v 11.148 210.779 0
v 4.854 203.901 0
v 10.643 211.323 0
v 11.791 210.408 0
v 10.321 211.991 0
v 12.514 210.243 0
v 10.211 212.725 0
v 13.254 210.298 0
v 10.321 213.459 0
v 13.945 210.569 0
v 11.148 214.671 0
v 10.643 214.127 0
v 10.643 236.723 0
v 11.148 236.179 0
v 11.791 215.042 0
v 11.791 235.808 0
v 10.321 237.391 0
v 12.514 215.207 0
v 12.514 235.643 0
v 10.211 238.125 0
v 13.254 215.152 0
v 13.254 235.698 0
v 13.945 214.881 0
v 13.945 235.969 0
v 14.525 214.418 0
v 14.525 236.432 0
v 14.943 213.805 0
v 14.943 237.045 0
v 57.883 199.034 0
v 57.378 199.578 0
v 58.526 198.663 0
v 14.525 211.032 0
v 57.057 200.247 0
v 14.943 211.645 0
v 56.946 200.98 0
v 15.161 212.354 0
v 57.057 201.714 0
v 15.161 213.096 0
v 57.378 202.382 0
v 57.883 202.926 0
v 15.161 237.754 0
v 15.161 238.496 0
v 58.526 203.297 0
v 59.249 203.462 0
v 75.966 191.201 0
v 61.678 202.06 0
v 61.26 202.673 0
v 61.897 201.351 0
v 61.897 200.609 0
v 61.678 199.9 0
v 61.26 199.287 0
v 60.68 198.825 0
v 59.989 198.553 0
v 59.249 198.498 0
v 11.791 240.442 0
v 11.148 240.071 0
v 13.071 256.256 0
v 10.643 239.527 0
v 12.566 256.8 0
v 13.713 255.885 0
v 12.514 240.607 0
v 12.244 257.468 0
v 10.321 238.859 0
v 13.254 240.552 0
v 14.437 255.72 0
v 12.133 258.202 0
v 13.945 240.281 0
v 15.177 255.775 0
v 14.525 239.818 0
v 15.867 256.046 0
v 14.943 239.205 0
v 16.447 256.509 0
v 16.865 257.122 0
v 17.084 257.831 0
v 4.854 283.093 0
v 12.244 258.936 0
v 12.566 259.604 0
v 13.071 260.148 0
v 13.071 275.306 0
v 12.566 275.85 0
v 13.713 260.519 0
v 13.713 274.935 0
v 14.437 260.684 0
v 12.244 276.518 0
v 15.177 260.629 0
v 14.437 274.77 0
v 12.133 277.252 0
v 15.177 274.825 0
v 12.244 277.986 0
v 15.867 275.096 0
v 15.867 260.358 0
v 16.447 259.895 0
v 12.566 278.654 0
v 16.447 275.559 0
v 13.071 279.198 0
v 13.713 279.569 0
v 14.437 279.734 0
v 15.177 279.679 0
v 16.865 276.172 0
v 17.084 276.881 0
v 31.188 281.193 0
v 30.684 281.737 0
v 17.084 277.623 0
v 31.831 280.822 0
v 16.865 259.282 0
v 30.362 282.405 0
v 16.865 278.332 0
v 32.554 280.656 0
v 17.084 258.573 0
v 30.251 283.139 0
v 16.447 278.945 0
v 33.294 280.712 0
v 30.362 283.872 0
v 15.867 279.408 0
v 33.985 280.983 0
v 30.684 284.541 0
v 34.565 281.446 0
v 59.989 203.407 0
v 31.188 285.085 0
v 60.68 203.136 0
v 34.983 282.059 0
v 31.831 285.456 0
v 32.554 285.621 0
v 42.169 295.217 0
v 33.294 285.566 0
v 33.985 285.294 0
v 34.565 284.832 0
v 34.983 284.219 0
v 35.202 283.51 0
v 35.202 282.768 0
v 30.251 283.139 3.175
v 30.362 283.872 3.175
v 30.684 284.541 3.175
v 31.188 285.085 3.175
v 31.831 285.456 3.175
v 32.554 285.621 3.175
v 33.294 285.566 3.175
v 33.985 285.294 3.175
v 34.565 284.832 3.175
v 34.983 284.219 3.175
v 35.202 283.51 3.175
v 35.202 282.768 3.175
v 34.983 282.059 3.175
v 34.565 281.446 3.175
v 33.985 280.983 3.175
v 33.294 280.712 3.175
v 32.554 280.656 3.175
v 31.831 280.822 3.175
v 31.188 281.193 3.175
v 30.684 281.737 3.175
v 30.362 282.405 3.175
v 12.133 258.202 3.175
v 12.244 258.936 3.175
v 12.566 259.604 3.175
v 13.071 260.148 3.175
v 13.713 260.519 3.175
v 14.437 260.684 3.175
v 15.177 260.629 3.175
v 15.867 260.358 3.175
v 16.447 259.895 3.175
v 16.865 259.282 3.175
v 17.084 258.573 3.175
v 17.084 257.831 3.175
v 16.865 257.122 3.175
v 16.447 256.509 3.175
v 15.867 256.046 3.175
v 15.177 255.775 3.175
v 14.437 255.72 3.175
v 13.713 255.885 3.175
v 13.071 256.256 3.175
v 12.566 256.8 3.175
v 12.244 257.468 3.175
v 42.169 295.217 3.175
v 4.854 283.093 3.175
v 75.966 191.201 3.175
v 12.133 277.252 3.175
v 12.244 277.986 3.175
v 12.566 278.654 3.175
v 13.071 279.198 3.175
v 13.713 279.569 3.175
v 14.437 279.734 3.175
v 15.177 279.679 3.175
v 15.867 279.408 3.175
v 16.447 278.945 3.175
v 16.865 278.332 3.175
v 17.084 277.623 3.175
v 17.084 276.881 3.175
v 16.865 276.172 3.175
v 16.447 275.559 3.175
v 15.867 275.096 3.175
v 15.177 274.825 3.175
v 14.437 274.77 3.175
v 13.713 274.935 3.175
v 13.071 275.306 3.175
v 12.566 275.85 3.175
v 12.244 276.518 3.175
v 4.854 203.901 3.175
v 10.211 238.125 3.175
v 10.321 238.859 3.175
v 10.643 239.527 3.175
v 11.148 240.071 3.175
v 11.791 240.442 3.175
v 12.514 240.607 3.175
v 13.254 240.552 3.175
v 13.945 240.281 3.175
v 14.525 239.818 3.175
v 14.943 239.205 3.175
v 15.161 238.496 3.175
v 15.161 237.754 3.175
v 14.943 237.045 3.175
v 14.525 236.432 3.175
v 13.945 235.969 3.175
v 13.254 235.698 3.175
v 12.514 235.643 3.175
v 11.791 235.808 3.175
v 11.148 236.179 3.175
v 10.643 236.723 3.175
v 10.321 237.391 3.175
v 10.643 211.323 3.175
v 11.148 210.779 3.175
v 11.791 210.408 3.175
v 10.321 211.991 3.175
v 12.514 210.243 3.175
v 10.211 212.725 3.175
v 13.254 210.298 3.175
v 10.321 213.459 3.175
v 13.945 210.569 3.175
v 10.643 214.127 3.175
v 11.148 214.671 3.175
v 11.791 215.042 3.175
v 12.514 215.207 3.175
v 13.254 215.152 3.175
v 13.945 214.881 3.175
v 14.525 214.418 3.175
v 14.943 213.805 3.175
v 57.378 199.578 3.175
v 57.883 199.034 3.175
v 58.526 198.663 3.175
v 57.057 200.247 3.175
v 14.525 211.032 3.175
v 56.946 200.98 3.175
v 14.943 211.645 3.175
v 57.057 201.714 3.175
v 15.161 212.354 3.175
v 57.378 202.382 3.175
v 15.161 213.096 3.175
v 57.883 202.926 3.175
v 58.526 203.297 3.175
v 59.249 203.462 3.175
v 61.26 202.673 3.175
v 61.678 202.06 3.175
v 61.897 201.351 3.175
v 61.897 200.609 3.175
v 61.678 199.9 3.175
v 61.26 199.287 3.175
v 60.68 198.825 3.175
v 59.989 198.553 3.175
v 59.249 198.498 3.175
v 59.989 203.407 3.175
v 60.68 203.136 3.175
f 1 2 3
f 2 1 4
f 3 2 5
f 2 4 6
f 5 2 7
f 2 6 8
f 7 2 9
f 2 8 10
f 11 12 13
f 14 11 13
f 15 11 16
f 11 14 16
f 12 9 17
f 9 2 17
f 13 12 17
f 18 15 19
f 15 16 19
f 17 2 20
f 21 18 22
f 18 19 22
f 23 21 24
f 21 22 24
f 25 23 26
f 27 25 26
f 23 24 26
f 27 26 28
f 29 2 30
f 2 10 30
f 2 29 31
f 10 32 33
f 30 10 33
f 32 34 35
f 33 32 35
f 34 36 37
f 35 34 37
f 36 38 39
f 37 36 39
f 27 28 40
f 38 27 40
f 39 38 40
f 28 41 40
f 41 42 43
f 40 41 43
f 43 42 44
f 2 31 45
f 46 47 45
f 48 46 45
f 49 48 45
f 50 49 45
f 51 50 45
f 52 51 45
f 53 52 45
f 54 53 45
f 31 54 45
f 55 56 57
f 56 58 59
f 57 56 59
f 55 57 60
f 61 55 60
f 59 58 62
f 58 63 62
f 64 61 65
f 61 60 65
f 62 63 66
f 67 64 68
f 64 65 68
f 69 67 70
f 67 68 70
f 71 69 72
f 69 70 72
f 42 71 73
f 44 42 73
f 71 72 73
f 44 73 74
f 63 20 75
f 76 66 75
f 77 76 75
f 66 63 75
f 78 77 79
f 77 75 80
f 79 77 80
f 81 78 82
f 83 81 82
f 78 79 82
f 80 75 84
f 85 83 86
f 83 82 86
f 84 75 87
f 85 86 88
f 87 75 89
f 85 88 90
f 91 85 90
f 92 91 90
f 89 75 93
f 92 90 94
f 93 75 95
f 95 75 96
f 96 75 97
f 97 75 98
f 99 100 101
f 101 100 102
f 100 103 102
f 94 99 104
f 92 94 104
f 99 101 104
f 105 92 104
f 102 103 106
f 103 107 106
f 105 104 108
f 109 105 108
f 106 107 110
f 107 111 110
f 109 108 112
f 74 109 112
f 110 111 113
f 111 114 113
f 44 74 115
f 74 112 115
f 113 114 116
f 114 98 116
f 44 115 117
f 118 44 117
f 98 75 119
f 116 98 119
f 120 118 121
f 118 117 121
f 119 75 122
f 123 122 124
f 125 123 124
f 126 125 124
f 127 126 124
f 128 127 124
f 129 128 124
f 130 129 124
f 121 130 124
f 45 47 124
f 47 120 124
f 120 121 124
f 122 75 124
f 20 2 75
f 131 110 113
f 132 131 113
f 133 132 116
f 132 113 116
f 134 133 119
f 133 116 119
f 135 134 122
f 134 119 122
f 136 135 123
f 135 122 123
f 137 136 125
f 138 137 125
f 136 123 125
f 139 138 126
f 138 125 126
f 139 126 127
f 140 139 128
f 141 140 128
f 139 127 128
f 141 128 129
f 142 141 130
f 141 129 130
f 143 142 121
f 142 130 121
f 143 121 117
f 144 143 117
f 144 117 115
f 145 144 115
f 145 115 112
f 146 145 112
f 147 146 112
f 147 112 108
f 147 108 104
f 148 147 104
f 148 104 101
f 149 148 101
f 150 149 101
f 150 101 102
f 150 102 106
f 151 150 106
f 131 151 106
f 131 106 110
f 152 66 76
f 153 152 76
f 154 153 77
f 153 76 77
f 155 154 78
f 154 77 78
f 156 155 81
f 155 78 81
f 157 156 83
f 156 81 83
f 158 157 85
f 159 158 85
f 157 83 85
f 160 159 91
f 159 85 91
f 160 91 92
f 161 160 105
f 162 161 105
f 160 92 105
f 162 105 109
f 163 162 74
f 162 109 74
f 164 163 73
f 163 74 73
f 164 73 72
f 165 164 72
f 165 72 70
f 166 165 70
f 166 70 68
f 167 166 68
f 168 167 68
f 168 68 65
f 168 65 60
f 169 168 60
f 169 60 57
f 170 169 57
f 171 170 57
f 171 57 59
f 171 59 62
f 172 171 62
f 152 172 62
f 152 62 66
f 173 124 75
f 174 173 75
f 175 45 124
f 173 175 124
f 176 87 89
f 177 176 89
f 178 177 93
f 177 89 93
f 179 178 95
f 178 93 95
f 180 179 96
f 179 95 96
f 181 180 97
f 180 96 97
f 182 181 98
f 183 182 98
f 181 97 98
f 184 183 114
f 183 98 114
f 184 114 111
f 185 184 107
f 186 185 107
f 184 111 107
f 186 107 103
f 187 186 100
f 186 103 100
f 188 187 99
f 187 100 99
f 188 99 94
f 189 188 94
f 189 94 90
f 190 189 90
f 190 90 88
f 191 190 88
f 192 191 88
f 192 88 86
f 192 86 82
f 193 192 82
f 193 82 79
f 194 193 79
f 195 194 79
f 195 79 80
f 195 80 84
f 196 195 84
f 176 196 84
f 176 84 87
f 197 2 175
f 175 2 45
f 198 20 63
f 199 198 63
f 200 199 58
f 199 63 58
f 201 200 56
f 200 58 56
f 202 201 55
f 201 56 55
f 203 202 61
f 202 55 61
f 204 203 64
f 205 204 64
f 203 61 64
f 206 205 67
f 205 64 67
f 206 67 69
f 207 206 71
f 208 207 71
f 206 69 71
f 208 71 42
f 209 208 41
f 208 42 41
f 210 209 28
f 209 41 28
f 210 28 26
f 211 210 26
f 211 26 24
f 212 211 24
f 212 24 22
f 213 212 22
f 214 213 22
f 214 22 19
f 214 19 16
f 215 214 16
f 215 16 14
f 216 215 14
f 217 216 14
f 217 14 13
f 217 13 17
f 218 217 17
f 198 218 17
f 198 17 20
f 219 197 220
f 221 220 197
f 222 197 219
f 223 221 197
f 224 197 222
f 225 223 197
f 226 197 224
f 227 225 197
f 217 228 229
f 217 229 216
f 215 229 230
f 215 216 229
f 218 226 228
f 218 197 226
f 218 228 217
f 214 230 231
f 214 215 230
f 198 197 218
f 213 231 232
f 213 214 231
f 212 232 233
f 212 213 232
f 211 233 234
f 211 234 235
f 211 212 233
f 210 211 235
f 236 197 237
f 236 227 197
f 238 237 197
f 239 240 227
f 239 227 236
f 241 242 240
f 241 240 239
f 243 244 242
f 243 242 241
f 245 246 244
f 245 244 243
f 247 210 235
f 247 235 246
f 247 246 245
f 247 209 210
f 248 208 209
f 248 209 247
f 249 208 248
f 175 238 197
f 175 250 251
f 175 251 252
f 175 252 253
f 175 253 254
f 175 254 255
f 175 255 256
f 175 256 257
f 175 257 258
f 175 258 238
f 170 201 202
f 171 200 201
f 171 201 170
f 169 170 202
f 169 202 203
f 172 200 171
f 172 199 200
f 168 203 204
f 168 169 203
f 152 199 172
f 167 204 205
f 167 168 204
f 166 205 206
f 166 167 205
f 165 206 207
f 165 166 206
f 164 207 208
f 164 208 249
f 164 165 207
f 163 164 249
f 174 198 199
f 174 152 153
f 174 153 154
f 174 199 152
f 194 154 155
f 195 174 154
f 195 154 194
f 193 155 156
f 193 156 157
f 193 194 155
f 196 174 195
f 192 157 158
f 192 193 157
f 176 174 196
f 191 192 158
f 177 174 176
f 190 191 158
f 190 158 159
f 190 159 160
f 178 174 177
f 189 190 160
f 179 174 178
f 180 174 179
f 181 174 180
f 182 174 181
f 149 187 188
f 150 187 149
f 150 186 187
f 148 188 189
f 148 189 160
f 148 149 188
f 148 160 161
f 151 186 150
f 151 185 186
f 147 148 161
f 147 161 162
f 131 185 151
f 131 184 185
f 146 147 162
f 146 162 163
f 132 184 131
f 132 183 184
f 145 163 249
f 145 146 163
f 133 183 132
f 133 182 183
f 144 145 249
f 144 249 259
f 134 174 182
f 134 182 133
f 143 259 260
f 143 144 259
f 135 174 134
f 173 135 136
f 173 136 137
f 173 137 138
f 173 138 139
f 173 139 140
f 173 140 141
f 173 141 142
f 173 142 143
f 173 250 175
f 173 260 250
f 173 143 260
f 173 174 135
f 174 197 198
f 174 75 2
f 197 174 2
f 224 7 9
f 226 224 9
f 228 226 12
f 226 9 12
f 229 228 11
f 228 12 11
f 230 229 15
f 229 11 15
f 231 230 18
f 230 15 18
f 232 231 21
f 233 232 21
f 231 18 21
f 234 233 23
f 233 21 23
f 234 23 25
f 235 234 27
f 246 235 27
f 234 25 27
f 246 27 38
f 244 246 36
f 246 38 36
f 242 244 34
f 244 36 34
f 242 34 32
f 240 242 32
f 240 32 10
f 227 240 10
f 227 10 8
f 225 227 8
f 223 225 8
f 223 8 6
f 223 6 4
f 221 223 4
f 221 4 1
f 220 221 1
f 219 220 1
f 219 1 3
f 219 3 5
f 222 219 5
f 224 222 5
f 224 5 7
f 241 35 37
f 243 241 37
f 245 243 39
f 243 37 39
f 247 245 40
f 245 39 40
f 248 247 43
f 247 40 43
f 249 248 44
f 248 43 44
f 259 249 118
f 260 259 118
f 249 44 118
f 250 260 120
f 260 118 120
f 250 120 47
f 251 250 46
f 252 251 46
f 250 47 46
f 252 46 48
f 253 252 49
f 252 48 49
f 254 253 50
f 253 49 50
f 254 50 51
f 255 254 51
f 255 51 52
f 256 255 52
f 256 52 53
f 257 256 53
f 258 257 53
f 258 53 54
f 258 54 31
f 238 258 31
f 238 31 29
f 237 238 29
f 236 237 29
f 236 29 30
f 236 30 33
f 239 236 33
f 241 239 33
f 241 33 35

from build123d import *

# Parameters (mm, degrees)
BOSS_EXTRUDE1_DEPTH    = 3.175
F_10_CLEARANCE_HOLE1_D = 4.9784


with BuildPart() as part:
    # Sketch2 → Boss-Extrude1 (new body)
    with BuildSketch(Plane.XY):
        Polygon((75.96605069, 191.201454104), (42.169306363, 295.217137729), (4.854209552, 283.092727808), (4.854209552, 203.901454104), align=None)
    extrude(amount=BOSS_EXTRUDE1_DEPTH)

    # #10 Clearance Hole1 (through all)
    with Locations(Plane.XY.offset(3.175)):
        with Locations((32.740251946, 283.138719963), (59.435154755, 200.980257064), (12.7, 238.125), (12.7, 212.725), (14.622625311, 277.25194622), (14.622625311, 258.20194622)):
            Hole(F_10_CLEARANCE_HOLE1_D / 2)


solid = part.part
